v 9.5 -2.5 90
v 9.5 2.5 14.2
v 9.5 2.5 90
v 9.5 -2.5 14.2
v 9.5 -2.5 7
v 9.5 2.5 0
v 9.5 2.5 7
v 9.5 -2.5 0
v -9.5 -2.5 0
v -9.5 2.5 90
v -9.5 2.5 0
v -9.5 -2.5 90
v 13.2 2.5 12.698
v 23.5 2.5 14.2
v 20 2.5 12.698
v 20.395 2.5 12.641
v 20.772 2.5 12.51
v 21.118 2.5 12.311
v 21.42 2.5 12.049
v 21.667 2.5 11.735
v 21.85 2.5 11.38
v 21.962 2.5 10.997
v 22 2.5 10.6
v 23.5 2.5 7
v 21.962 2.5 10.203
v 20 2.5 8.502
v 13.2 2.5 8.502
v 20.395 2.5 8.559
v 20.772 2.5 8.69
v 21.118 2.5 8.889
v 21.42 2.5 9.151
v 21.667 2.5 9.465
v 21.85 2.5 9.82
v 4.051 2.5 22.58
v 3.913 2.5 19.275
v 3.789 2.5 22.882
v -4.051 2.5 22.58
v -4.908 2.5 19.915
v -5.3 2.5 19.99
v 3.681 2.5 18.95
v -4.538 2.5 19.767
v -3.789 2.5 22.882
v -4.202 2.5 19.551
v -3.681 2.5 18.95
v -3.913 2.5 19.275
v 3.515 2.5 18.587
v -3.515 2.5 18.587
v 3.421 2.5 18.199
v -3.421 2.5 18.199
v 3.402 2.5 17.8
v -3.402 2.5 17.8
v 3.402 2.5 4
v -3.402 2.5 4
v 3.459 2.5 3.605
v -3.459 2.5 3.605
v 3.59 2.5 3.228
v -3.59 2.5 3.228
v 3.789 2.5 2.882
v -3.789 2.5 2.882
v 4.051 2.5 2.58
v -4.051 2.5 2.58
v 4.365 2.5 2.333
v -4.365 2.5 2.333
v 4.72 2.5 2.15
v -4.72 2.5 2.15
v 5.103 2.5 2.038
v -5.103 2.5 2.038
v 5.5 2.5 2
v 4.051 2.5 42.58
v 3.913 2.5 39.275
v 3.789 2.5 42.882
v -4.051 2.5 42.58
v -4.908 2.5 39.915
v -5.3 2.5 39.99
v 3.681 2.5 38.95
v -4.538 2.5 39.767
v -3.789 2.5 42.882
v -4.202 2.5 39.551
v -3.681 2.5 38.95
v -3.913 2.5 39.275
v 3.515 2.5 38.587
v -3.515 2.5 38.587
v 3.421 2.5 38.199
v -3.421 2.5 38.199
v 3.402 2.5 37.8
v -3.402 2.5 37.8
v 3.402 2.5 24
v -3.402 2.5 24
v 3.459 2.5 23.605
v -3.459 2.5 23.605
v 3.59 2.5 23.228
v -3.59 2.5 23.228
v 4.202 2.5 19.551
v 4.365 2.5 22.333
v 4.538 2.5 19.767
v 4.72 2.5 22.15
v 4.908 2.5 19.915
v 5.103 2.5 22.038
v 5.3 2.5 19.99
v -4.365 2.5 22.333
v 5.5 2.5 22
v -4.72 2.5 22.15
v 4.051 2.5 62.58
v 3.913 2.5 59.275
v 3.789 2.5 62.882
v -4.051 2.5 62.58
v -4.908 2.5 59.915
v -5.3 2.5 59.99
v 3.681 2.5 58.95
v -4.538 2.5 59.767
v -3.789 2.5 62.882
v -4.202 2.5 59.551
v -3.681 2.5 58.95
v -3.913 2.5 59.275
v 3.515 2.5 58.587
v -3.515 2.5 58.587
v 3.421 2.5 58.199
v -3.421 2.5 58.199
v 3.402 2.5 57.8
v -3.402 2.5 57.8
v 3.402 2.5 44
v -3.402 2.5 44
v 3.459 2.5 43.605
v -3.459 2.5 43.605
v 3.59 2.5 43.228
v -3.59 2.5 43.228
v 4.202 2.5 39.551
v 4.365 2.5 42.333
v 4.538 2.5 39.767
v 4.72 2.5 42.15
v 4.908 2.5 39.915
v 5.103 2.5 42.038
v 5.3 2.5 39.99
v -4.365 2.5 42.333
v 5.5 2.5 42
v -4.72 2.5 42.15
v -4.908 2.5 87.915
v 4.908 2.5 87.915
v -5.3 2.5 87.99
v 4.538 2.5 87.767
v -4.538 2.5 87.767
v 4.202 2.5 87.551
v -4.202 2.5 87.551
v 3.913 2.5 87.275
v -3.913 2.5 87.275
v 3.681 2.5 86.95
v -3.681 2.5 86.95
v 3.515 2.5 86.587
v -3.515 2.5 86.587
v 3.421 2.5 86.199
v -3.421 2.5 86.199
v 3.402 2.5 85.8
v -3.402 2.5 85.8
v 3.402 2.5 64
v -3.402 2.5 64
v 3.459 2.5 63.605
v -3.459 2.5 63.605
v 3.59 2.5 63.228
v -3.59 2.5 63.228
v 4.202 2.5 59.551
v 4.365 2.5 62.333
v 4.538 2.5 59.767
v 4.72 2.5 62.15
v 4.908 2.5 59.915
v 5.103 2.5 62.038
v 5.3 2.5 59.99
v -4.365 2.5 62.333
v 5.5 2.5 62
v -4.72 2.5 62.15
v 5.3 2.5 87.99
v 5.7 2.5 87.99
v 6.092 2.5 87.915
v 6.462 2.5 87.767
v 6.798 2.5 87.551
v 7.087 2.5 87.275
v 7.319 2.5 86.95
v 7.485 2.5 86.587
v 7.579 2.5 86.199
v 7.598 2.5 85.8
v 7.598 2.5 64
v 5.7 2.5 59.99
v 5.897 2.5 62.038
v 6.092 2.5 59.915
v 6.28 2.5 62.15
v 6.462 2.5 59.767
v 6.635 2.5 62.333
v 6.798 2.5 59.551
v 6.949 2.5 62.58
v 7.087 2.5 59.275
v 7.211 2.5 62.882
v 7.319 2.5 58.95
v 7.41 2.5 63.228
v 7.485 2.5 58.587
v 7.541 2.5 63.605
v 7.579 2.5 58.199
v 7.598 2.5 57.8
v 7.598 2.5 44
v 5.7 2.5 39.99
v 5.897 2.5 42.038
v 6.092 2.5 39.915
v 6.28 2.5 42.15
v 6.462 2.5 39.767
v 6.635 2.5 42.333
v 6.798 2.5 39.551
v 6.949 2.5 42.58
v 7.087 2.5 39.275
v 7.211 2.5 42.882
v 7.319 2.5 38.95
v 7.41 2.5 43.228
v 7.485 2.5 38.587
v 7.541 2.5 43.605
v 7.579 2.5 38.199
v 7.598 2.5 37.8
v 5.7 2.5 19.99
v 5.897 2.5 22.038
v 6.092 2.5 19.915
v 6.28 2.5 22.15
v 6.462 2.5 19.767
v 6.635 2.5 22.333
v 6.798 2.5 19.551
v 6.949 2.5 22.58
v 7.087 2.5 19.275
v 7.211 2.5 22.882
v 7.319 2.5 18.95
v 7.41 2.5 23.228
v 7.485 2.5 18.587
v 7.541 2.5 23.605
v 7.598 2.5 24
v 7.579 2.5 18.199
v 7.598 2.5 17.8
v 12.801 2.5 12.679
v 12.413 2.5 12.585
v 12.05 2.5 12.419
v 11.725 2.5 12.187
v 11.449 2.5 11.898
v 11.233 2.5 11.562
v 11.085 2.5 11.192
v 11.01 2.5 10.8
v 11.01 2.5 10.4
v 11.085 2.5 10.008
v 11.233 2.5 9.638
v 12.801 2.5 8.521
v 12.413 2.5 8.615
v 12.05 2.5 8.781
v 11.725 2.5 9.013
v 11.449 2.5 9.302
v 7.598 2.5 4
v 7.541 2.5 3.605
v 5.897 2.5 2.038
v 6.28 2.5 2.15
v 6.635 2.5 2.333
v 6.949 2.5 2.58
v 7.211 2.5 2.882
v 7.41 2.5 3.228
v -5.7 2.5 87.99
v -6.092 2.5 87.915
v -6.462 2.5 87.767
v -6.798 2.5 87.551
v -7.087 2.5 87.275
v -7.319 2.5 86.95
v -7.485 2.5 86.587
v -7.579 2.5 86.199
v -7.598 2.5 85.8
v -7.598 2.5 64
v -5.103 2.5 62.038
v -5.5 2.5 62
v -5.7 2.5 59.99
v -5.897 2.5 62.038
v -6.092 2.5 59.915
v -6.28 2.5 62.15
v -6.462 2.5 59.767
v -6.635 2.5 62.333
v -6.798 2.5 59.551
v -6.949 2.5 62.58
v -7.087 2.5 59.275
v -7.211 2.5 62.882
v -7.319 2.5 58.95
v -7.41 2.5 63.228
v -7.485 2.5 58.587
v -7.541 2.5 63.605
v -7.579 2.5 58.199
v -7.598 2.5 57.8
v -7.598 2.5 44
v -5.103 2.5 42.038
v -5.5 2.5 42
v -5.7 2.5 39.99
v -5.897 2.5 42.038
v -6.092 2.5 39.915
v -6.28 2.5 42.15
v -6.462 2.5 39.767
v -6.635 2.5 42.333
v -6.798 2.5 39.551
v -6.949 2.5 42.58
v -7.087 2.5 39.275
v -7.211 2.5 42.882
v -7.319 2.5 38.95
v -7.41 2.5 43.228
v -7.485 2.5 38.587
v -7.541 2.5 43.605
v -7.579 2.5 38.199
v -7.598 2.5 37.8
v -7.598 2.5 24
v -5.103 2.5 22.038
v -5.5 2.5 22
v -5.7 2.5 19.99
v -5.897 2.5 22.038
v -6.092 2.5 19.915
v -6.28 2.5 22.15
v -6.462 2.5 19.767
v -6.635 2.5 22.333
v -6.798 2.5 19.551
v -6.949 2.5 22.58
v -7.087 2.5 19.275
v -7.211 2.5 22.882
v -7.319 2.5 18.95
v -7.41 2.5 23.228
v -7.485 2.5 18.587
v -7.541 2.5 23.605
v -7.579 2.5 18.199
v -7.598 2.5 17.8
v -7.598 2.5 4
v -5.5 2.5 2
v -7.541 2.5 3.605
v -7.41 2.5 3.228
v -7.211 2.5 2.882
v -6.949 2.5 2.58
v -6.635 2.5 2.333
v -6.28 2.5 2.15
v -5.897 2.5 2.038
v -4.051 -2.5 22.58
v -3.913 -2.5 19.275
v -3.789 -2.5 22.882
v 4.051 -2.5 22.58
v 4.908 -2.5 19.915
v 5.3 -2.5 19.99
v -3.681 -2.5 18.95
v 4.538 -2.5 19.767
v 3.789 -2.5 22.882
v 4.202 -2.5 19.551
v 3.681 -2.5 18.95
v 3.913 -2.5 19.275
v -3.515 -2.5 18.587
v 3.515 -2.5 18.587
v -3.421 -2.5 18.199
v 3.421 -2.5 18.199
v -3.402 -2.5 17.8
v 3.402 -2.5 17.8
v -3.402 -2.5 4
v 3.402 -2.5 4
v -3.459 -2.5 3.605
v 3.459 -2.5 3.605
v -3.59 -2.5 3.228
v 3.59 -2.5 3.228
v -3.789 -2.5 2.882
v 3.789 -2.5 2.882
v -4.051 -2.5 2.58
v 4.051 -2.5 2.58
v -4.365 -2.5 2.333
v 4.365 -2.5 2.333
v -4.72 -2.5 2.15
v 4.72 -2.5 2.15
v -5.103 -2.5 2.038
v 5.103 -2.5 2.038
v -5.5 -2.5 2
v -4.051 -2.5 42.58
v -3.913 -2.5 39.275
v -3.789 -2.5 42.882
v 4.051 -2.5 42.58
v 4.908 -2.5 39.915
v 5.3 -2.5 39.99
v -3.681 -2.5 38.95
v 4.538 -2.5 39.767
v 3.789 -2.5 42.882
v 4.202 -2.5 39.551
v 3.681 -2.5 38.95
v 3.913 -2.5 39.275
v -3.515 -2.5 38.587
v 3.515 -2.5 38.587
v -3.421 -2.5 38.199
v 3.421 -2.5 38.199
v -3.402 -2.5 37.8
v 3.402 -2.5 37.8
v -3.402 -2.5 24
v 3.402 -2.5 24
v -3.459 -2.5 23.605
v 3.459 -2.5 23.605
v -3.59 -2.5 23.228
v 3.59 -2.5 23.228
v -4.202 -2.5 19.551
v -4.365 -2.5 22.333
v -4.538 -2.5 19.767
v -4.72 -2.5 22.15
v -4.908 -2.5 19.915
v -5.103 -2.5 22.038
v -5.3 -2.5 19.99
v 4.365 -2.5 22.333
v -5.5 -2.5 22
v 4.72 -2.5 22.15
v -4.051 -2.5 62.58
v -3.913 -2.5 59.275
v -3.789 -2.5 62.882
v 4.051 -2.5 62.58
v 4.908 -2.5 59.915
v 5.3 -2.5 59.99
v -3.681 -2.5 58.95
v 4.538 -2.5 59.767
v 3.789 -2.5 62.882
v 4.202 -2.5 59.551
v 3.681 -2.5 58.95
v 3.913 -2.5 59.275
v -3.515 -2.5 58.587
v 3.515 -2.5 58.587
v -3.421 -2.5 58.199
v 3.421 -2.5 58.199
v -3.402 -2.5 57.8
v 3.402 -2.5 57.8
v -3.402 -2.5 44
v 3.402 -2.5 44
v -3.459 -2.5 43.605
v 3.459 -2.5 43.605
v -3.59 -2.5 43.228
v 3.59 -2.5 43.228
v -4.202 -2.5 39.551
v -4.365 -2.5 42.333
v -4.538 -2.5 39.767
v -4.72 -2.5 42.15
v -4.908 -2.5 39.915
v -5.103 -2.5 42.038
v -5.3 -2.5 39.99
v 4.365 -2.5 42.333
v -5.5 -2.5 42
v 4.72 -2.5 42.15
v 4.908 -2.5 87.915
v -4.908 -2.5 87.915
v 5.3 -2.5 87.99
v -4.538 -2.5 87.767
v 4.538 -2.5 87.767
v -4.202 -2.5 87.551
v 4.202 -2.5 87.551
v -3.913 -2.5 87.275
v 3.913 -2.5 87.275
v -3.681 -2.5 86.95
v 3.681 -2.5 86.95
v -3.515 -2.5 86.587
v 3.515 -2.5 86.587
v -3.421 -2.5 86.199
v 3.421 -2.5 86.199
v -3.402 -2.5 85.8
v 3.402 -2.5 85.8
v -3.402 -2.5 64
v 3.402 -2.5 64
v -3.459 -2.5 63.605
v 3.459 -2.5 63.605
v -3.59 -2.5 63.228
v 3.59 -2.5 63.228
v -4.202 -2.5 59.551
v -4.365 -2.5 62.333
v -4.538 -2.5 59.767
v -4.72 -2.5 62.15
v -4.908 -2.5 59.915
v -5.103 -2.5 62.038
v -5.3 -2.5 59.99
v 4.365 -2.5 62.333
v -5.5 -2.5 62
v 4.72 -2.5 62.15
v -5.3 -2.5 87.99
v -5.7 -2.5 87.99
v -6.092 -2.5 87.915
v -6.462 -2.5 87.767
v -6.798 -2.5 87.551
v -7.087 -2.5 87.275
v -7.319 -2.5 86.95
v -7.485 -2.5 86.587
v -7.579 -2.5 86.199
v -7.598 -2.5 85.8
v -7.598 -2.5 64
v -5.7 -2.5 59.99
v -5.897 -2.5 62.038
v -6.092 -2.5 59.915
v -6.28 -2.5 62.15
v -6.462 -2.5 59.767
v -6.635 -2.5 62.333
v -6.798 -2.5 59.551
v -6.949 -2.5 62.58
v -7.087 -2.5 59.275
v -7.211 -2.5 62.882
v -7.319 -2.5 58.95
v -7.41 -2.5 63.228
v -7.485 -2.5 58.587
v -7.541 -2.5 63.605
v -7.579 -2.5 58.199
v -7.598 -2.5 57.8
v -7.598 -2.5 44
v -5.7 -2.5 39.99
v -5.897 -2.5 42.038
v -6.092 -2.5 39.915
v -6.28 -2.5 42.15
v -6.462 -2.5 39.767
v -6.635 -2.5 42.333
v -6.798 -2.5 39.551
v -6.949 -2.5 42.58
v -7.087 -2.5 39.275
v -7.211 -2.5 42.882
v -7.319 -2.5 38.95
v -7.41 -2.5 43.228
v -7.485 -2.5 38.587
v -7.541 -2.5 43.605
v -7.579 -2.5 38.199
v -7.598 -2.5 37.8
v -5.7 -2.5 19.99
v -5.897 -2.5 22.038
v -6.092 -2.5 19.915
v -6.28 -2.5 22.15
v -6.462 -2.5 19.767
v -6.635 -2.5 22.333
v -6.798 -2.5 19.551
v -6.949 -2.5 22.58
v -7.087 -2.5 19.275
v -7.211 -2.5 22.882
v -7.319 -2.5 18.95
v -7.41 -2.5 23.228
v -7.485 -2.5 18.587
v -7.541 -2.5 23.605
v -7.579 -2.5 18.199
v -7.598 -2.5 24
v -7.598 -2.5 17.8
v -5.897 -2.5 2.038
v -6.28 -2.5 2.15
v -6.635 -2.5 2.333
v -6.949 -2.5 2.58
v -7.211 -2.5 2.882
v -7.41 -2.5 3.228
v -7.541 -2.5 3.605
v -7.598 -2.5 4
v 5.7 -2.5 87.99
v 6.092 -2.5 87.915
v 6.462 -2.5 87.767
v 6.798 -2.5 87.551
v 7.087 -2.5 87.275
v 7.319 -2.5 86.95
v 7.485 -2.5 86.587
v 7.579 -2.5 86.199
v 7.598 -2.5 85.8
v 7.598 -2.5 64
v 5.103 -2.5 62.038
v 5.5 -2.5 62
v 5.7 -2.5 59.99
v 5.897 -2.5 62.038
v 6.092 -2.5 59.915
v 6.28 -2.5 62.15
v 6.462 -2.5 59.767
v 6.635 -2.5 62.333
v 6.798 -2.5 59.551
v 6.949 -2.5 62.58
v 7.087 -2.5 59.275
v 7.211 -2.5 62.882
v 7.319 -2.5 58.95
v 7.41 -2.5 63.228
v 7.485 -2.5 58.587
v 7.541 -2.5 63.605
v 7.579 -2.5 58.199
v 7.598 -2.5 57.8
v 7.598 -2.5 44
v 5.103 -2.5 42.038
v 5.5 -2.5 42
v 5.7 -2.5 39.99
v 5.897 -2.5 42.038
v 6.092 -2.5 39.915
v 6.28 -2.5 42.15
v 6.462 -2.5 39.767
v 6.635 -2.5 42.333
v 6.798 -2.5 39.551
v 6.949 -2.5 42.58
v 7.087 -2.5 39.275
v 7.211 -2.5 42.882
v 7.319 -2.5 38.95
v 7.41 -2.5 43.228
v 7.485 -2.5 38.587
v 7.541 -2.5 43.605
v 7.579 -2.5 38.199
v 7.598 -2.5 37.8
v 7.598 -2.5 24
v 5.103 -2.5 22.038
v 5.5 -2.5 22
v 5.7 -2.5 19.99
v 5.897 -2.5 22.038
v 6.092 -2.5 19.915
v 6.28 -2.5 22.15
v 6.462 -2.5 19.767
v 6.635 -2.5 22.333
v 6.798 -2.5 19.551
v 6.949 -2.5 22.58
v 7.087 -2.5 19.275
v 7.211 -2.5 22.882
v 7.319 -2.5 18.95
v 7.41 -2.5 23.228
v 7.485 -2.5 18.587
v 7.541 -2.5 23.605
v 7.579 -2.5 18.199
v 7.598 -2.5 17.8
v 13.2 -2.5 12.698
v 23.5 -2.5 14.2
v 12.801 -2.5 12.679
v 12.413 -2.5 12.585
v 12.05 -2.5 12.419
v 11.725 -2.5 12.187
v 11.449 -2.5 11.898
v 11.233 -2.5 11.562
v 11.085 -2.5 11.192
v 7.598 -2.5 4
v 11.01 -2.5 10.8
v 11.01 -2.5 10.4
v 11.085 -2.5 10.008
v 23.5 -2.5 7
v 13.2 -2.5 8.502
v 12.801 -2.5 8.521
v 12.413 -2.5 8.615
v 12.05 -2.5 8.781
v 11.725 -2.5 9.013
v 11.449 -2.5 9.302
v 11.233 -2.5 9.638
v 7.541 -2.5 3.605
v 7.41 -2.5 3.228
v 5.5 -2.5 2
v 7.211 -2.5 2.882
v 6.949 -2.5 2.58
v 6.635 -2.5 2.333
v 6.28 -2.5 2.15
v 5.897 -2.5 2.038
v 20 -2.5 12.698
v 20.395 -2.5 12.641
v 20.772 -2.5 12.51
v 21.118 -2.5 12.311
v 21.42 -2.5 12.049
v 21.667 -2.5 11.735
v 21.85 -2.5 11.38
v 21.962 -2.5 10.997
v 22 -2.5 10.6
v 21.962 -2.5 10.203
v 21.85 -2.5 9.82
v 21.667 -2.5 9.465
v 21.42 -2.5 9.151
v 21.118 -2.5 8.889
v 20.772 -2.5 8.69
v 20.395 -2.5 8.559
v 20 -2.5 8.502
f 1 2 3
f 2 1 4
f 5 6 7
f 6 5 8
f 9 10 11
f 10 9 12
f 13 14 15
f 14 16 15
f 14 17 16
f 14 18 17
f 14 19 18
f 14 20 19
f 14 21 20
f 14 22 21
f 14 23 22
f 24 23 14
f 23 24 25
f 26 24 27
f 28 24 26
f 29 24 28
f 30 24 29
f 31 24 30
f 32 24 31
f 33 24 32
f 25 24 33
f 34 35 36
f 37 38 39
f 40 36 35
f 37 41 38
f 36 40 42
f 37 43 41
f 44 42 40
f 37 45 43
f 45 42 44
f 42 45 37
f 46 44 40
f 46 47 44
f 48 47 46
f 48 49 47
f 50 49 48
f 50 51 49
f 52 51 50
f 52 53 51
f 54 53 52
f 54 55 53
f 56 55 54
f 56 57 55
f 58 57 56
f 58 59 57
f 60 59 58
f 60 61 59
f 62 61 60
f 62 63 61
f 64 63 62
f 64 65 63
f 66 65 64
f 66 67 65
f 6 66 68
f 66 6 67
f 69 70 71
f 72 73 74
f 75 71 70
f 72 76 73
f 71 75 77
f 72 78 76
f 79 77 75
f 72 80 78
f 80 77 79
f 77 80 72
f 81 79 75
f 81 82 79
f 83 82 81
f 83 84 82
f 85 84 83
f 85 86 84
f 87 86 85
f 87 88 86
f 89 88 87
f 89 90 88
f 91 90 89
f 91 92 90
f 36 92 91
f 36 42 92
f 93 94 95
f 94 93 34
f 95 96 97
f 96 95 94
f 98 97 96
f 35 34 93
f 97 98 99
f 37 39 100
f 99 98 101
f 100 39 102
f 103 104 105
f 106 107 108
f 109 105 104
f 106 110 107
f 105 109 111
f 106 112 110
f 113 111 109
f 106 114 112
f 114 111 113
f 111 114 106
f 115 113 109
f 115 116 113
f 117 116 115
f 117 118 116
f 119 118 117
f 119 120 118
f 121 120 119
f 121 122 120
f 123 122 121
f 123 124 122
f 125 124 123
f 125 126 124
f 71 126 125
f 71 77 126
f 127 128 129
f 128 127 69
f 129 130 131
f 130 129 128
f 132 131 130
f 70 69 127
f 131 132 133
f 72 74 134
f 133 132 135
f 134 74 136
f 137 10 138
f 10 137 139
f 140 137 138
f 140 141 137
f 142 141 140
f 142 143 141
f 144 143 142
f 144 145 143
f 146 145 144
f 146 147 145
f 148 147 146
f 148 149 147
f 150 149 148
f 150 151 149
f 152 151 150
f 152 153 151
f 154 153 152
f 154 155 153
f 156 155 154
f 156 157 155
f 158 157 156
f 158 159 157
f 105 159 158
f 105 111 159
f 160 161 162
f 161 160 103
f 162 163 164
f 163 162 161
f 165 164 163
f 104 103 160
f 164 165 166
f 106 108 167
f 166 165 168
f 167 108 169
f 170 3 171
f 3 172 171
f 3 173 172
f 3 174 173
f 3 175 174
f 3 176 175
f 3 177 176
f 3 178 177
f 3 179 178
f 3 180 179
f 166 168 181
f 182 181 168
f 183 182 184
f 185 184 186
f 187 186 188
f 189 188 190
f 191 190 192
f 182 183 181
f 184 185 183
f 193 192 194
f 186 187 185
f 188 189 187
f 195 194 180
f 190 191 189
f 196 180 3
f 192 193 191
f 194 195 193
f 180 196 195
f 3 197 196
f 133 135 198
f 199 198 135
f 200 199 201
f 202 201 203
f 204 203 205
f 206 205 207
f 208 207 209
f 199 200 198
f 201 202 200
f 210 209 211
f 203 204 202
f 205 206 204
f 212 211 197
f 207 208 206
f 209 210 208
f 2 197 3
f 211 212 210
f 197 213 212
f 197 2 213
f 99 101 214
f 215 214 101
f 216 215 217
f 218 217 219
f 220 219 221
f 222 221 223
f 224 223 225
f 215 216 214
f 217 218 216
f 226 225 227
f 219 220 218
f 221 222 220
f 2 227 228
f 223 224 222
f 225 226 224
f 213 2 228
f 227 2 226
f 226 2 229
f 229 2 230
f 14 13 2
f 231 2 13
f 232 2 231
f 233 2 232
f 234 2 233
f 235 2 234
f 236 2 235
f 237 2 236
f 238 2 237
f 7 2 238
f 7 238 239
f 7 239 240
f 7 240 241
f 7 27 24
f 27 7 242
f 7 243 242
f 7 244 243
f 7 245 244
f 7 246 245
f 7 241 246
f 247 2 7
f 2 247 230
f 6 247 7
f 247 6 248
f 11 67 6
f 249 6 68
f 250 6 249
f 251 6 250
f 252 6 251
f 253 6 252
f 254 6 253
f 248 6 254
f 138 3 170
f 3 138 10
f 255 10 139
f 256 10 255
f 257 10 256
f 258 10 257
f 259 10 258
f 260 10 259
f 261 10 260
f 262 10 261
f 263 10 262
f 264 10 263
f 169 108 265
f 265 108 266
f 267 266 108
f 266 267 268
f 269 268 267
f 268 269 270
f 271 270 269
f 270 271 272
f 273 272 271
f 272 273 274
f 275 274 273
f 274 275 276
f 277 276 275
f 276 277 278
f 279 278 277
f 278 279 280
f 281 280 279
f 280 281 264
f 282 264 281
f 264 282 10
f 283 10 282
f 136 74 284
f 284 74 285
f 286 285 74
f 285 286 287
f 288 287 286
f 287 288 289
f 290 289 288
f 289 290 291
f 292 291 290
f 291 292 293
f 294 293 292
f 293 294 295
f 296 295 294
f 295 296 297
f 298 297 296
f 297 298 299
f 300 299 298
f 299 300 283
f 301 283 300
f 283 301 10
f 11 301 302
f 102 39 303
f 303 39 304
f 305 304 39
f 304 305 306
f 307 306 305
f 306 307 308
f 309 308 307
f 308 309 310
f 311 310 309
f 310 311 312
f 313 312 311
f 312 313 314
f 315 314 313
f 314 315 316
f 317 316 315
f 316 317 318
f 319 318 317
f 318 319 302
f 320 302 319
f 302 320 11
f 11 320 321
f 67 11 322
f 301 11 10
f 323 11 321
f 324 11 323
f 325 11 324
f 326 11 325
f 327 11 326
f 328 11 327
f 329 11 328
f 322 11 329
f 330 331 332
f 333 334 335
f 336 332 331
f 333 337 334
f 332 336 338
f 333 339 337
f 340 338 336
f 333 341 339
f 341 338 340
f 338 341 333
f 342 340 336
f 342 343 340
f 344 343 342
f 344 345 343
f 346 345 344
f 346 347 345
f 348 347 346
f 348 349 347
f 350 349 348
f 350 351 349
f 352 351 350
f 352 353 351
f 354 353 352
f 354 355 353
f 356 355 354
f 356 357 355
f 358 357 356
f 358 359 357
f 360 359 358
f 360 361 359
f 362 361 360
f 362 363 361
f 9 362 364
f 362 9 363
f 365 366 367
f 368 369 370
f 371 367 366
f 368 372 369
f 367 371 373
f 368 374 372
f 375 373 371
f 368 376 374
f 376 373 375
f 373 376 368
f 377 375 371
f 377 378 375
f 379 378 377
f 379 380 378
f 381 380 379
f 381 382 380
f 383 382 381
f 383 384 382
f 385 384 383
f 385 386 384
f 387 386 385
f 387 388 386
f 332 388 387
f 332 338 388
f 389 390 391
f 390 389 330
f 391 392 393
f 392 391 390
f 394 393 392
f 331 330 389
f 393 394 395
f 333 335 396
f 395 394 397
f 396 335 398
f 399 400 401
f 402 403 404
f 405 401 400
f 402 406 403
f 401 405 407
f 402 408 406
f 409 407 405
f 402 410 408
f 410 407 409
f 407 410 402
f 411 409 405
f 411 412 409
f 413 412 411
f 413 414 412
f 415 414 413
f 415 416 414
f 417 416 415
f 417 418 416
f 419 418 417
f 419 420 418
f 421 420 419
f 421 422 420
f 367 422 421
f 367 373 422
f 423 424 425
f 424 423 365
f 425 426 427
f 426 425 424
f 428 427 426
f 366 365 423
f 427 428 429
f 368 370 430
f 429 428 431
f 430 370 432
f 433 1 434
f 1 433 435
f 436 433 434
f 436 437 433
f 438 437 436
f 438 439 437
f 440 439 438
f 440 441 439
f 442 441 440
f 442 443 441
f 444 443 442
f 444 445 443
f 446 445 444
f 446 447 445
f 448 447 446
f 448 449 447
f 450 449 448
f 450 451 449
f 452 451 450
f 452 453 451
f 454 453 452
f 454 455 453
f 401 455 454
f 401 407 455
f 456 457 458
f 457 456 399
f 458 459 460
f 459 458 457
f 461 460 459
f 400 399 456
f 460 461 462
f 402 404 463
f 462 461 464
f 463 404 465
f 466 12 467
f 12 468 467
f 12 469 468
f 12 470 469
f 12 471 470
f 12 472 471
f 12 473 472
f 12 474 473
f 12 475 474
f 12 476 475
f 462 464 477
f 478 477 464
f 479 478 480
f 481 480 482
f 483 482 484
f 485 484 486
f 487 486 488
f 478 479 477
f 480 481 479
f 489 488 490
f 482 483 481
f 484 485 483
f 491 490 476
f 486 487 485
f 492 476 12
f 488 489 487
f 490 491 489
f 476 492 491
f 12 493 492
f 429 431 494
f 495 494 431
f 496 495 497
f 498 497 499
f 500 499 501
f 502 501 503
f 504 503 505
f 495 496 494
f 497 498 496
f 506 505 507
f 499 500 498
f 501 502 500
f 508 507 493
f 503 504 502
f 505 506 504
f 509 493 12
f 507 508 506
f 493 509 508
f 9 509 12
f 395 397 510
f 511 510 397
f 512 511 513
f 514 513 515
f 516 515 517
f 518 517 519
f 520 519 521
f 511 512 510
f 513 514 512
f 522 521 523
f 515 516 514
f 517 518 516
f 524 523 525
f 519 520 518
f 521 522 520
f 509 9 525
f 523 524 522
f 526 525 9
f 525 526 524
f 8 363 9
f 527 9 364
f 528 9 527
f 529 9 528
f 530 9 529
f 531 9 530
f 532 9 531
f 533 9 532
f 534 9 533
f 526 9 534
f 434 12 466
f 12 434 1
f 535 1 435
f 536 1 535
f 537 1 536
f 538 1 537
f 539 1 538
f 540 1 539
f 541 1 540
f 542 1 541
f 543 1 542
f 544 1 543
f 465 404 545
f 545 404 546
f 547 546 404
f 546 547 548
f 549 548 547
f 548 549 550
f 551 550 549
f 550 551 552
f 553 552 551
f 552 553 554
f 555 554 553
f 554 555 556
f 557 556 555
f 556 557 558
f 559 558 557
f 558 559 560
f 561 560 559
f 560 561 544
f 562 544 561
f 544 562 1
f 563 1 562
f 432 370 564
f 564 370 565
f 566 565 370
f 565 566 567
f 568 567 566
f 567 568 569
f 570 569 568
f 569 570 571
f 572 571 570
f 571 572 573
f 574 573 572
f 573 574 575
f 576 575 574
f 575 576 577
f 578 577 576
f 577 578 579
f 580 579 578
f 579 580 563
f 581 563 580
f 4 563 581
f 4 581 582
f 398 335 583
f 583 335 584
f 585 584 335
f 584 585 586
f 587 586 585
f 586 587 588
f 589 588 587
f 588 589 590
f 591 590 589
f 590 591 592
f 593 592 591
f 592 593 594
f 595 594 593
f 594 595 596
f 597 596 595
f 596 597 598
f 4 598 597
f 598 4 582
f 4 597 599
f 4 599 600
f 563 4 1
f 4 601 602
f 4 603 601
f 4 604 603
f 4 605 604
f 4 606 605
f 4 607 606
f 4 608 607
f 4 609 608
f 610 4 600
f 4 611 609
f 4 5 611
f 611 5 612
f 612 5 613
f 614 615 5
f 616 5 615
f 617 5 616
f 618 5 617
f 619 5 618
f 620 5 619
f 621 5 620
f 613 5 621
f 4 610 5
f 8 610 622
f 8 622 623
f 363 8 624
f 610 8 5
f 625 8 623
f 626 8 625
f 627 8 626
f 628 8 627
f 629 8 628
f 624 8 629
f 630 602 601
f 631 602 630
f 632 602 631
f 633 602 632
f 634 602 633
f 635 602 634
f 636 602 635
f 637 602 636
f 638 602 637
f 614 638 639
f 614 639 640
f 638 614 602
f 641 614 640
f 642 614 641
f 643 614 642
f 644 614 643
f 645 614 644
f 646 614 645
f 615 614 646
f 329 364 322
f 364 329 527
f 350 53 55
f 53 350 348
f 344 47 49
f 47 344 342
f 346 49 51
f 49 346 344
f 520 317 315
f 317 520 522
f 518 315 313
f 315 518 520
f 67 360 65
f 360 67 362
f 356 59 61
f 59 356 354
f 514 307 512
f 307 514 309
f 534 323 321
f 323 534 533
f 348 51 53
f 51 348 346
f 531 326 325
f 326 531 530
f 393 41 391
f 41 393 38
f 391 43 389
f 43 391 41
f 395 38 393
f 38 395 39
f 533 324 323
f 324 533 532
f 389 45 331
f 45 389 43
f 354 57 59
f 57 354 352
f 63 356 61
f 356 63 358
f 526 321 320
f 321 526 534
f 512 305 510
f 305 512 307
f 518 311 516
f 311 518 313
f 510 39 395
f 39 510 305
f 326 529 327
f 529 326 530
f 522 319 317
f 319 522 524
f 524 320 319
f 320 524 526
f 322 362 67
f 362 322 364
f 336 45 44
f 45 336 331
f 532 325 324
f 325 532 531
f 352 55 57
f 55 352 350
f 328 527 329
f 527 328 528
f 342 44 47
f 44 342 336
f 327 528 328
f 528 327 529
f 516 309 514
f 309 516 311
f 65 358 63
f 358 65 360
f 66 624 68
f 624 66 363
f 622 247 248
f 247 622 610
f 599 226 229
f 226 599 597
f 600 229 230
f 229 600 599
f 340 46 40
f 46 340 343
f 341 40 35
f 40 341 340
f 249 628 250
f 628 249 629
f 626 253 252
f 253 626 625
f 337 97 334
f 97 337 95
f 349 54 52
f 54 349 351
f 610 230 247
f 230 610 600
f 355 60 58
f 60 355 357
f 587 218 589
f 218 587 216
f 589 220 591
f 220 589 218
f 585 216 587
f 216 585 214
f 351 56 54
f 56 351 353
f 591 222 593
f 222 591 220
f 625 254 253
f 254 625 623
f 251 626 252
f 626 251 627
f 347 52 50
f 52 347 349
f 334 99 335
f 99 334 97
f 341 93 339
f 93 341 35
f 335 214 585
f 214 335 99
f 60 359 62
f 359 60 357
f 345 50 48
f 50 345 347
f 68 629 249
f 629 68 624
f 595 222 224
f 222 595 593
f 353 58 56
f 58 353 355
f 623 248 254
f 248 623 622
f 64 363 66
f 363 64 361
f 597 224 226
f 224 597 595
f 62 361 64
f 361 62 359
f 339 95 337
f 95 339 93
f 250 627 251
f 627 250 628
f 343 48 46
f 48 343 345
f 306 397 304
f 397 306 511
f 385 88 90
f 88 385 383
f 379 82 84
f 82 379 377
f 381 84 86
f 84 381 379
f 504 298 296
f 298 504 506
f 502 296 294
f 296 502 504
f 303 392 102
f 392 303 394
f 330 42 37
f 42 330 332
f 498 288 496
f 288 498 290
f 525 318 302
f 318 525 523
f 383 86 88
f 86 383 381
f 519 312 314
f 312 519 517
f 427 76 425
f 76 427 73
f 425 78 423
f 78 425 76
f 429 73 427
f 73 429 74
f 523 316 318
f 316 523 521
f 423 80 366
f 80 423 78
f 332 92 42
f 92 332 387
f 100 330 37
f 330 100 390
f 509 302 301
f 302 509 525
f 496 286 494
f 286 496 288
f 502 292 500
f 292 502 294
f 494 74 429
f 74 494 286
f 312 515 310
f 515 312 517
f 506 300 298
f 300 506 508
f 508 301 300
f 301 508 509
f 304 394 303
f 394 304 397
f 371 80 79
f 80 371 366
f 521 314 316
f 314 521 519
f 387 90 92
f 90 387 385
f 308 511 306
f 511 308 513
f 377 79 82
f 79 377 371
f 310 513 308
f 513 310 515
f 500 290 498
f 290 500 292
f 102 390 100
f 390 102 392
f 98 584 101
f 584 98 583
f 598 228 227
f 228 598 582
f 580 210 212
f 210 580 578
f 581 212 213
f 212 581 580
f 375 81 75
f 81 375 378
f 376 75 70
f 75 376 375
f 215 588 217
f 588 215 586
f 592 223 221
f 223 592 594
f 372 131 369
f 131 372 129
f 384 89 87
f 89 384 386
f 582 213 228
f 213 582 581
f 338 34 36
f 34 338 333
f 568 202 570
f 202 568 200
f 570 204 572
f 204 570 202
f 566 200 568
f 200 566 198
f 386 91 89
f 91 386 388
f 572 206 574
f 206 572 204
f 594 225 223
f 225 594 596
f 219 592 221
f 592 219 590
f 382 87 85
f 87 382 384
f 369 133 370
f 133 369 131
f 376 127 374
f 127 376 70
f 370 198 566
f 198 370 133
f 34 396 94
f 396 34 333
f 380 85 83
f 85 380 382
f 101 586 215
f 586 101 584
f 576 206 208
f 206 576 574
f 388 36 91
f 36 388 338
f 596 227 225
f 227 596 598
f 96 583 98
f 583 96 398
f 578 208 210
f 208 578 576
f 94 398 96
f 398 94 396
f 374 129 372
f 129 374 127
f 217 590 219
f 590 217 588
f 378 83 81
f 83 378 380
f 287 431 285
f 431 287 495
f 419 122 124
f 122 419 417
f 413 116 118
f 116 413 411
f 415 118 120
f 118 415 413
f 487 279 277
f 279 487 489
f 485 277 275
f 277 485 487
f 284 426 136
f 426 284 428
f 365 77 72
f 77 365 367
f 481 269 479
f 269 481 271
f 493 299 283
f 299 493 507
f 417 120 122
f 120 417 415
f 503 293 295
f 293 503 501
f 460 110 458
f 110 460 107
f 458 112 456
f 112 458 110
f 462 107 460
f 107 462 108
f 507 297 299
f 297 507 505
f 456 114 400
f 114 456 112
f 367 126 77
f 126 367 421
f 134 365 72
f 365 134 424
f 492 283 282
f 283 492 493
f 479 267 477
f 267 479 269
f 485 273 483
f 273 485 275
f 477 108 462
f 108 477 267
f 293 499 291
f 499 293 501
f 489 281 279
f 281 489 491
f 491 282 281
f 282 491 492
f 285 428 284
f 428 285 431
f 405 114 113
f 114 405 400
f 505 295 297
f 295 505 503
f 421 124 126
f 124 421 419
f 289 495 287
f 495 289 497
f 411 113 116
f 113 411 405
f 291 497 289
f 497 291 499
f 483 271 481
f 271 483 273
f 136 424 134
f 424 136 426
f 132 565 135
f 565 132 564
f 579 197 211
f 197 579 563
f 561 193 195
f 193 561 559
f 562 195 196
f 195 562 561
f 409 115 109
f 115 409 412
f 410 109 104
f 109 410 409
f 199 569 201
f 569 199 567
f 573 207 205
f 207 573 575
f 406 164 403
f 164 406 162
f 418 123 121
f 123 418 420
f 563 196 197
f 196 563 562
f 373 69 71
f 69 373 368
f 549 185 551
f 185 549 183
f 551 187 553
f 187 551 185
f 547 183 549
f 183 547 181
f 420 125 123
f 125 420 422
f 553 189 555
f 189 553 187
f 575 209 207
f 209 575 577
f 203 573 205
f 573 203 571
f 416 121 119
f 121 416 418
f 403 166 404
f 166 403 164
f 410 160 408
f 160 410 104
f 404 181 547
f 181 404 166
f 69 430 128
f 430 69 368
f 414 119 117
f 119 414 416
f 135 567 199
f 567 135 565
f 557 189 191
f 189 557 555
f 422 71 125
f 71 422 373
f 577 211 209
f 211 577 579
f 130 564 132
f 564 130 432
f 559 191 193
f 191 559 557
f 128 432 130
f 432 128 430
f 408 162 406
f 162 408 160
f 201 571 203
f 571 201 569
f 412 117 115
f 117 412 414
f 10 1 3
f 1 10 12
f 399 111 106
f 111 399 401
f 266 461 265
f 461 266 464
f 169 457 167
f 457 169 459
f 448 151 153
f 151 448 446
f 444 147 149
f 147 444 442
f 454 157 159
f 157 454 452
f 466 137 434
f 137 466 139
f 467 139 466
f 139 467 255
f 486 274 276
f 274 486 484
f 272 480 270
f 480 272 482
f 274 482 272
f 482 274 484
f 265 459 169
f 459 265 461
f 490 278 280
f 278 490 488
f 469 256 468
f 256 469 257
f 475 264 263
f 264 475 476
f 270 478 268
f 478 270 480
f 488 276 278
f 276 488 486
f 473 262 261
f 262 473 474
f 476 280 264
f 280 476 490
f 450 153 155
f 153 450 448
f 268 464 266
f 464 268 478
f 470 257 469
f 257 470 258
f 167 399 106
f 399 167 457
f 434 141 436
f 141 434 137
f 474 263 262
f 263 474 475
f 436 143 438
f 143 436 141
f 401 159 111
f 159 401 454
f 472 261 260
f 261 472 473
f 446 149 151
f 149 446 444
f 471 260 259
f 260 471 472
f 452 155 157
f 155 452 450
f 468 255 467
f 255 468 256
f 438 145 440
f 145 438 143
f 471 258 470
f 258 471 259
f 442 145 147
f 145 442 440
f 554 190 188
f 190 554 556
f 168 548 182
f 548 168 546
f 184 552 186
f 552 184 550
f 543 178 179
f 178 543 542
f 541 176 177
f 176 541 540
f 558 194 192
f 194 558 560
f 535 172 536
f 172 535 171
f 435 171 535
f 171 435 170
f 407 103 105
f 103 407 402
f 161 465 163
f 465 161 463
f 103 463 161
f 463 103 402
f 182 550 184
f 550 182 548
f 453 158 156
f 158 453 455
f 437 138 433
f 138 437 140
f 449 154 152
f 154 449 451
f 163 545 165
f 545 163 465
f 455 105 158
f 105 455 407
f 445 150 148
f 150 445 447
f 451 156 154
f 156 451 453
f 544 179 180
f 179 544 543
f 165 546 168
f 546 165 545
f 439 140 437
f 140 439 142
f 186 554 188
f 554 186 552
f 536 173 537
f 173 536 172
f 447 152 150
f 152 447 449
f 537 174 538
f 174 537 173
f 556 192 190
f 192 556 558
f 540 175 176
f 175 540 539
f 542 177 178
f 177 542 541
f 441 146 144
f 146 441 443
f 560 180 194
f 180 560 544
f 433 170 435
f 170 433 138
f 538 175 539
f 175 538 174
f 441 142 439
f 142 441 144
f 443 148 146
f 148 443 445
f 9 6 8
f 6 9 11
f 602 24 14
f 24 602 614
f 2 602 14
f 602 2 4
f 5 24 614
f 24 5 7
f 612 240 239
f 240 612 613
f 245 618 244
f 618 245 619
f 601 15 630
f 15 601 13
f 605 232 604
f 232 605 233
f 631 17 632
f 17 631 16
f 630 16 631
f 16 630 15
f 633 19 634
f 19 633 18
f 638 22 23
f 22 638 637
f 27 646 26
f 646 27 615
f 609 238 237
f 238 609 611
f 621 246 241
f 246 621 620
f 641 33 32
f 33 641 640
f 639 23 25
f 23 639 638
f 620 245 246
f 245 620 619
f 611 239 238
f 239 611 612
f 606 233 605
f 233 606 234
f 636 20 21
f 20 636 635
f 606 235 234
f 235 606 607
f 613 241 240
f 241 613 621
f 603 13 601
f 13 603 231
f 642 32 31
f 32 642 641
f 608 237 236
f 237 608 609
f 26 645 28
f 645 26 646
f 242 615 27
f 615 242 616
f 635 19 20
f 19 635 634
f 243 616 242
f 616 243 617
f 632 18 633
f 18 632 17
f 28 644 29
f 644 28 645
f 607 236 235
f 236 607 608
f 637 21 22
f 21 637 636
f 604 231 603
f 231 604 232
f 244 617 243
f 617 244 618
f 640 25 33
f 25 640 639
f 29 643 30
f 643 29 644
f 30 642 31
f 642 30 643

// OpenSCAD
/* Begin suggested config */
total_height = 70; // total screw travel. Outer actual will be a little bigger.
depth = 5; // want to be kinda thick so it doesn't move

// If false, remainder is a small segment on top
// If true, top segment is stretched to fill space.
remainder_fill = true; 

screw_distance = 11;
screw_hole_d = 4.2;

track_length = 18;
track_spacing = 2;
frame_width = 19; // 2020 frame is 20mm wide

offshoot=true;
offshoot_track=11;
offshoot_padding = 3;
offshoot_z_offset = track_length/2 - track_spacing;
offshoot_x_offset = 0;

/* end config */


$fa = 1;
$fs = 0.4;
fudge = 0.001;


panel_segment_height = (track_length + track_spacing);
// -track_spacing because we always put a block of 1 track_spacing at the bottom
normal_panel_count = floor((total_height - track_spacing) / panel_segment_height);
// panel_remainder does not have track_spacing included.
panel_remainder = (total_height - track_spacing) - (normal_panel_count * panel_segment_height) - track_spacing;
min_panel_height = (track_spacing + screw_hole_d) + 0.1;
echo("normal_panel_count", normal_panel_count);
echo("remainder", panel_remainder);
echo("min_panel_height", min_panel_height);

// If there's not enough space for an independent remainder section, we forcefully fill it.
do_remainder_fill = (panel_remainder > min_panel_height) ? remainder_fill : true;
if (do_remainder_fill != remainder_fill) {
    echo("WARNING: Not enough space, forcing remainder_fill = true");
}

/* BEGIN */


union(){
    
    
    
        all_panels();
    
    if (offshoot) {
        #translate([
            ((frame_width/2)+((offshoot_track + offshoot_padding)/2)) + offshoot_x_offset,
            0,
            ((screw_hole_d + offshoot_padding)/2) + offshoot_z_offset
        ]){
            difference() {
                cube([offshoot_track + offshoot_padding, depth, screw_hole_d + offshoot_padding], center=true);
                hull()
                    screw_holes(offshoot_track - screw_hole_d, screw_hole_d, depth, vertical=false);
            }
        }
    }
    
}

module all_panels() {
    // Align btm of all_panels to Z=0
    translate([0, 0, (panel_segment_height/2) + track_spacing])
    union() {
        for(i = [0 : (normal_panel_count - (do_remainder_fill ? 1 : 0))]) {
            translate([0, 0, (panel_segment_height*i)])
                panel();
        }
        if (do_remainder_fill) {
            btm_align = panel_remainder/2 + track_spacing/2;
            remainder_offset = btm_align + (panel_segment_height*normal_panel_count);
            // need to include track_spacing because there would be an extra spacer here
            translate([0, 0, remainder_offset])
                panel(panel_segment_height + panel_remainder);
        }
        else {
            btm_align = -((panel_segment_height/2)-(panel_remainder/2 + track_spacing/2));
            remainder_offset = btm_align + (panel_segment_height*(normal_panel_count+1));
            translate([0, 0, remainder_offset])
                panel(panel_remainder);
        }
        // little extra piece at the bottom
        translate([0, 0, (panel_segment_height/-2) + (track_spacing/-2)])
            cube([frame_width, depth, track_spacing], center=true);
    }
    
}

module panel(want_track_length = track_length) {
    
    new_track_len = want_track_length - screw_hole_d;
    // new_height should be == panel_segment_height with defaults
    new_height = want_track_length + track_spacing;
    mv_down = track_spacing/-2;
    
    difference() {
        cube([frame_width, depth, new_height], center=true);
        
        translate([screw_distance/-2, 0, mv_down])
            hull()
            screw_holes(new_track_len, screw_hole_d, depth, vertical=true);
        translate([screw_distance/2, 0, mv_down])
            hull()
            screw_holes(new_track_len, screw_hole_d, depth, vertical=true);
        
    }
}

module screw_holes(distance, diameter, wall, vertical=true) {
    //translate([0, 0, (switch_height/2) - (switch_screw_hole_d/2) - (wall/2)])
    rotate(vertical ? 90 : 0, [0, 1, 0])
    for (s = [-2:4:2]) {
        translate([distance/s, 0, 0])
        rotate([90, 0, 0])
        cylinder(wall*4, d=diameter, center=true);
    }
}

/*

wall = 3;


frame_screw_distance = 11;
frame_screw_hole_d = 4.2;
frame_width = max(17, frame_screw_hole_d + wall); // 2020 frame is 20mm wide
frame_height = frame_screw_distance + frame_screw_hole_d + wall;

switch_screw_distance = 11;
switch_screw_hole_d = 4;
switch_width = max(17, switch_screw_distance + switch_screw_hole_d + wall);
switch_height = 67; // total outside, screw guides will be smaller
switch_extra_width = wall*2; // for support
switch_screw_offset_bottom = wall;

switch_screw_guide_length = switch_height - wall - switch_screw_hole_d - switch_screw_offset_bottom;


union() {
    // frame
    translate([switch_width/2 + frame_width/2, 0, 0])
    difference() {
        cube([frame_width, wall, frame_height], center=true);
        
        screw_holes(frame_screw_distance, frame_screw_hole_d, vertical=true);
    }


    // vert
    translate([0, 0, switch_height/2 - frame_height/2])    
    difference() {
        cube([switch_width + switch_extra_width, wall, switch_height], center=true);
        
        for (v = [-1:2:1]) {
            translate([(switch_screw_distance / 2) * v, 0, switch_screw_offset_bottom/2])
            hull()
            screw_holes(switch_screw_guide_length, switch_screw_hole_d, vertical=true);
        }
    }
    
}

module screw_holes(distance, diameter, vertical=true) {
    //translate([0, 0, (switch_height/2) - (switch_screw_hole_d/2) - (wall/2)])
    rotate(vertical ? 90 : 0, [0, 1, 0])
    for (s = [-2:4:2]) {
        translate([distance/s, 0, 0])
        rotate([90, 0, 0])
        cylinder(wall*4, d=diameter, center=true);
    }
}
*/
